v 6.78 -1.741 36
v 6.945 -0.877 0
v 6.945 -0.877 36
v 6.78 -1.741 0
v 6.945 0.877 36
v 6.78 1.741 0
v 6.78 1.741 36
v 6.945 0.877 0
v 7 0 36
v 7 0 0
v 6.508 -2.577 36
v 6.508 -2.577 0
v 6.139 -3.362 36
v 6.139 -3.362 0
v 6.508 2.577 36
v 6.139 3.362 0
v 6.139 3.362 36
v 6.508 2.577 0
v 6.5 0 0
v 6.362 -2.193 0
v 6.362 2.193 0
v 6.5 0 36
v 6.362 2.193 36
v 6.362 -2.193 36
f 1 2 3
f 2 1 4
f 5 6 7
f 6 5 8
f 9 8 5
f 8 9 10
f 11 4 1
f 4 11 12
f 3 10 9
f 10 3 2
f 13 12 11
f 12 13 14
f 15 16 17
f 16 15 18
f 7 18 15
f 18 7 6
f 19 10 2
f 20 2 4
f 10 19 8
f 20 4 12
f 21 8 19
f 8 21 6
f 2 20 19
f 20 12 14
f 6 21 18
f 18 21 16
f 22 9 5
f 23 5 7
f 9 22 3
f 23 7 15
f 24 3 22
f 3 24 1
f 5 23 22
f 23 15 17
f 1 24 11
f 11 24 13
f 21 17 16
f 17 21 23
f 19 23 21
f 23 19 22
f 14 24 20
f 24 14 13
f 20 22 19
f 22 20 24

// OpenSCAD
$fn = 50;


difference() {
	union() {
		cylinder(h = 36, r = 7.0000000000);
		translate(v = [-14.0000000000, 0, 0]) {
			cylinder(h = 36, r = 7.0000000000);
		}
	}
	union() {
		cylinder(h = 36, r = 3.2500000000);
		cylinder(h = 36, r = 1.8000000000);
		cylinder(h = 36, r = 1.8000000000);
		cylinder(h = 36, r = 1.8000000000);
		translate(v = [-18.5000000000, 0, 0]) {
			hull() {
				translate(v = [-3.7500000000, 0.0000000000, 0]) {
					cylinder(h = 36, r = 7.5000000000);
				}
				translate(v = [3.7500000000, 0.0000000000, 0]) {
					cylinder(h = 36, r = 7.5000000000);
				}
				translate(v = [-3.7500000000, -0.0000000000, 0]) {
					cylinder(h = 36, r = 7.5000000000);
				}
				translate(v = [3.7500000000, -0.0000000000, 0]) {
					cylinder(h = 36, r = 7.5000000000);
				}
			}
		}
		translate(v = [-11.0000000000, 0, 0.0000000000]) {
			cylinder(h = 36, r = 17.5000000000);
		}
	}
}
